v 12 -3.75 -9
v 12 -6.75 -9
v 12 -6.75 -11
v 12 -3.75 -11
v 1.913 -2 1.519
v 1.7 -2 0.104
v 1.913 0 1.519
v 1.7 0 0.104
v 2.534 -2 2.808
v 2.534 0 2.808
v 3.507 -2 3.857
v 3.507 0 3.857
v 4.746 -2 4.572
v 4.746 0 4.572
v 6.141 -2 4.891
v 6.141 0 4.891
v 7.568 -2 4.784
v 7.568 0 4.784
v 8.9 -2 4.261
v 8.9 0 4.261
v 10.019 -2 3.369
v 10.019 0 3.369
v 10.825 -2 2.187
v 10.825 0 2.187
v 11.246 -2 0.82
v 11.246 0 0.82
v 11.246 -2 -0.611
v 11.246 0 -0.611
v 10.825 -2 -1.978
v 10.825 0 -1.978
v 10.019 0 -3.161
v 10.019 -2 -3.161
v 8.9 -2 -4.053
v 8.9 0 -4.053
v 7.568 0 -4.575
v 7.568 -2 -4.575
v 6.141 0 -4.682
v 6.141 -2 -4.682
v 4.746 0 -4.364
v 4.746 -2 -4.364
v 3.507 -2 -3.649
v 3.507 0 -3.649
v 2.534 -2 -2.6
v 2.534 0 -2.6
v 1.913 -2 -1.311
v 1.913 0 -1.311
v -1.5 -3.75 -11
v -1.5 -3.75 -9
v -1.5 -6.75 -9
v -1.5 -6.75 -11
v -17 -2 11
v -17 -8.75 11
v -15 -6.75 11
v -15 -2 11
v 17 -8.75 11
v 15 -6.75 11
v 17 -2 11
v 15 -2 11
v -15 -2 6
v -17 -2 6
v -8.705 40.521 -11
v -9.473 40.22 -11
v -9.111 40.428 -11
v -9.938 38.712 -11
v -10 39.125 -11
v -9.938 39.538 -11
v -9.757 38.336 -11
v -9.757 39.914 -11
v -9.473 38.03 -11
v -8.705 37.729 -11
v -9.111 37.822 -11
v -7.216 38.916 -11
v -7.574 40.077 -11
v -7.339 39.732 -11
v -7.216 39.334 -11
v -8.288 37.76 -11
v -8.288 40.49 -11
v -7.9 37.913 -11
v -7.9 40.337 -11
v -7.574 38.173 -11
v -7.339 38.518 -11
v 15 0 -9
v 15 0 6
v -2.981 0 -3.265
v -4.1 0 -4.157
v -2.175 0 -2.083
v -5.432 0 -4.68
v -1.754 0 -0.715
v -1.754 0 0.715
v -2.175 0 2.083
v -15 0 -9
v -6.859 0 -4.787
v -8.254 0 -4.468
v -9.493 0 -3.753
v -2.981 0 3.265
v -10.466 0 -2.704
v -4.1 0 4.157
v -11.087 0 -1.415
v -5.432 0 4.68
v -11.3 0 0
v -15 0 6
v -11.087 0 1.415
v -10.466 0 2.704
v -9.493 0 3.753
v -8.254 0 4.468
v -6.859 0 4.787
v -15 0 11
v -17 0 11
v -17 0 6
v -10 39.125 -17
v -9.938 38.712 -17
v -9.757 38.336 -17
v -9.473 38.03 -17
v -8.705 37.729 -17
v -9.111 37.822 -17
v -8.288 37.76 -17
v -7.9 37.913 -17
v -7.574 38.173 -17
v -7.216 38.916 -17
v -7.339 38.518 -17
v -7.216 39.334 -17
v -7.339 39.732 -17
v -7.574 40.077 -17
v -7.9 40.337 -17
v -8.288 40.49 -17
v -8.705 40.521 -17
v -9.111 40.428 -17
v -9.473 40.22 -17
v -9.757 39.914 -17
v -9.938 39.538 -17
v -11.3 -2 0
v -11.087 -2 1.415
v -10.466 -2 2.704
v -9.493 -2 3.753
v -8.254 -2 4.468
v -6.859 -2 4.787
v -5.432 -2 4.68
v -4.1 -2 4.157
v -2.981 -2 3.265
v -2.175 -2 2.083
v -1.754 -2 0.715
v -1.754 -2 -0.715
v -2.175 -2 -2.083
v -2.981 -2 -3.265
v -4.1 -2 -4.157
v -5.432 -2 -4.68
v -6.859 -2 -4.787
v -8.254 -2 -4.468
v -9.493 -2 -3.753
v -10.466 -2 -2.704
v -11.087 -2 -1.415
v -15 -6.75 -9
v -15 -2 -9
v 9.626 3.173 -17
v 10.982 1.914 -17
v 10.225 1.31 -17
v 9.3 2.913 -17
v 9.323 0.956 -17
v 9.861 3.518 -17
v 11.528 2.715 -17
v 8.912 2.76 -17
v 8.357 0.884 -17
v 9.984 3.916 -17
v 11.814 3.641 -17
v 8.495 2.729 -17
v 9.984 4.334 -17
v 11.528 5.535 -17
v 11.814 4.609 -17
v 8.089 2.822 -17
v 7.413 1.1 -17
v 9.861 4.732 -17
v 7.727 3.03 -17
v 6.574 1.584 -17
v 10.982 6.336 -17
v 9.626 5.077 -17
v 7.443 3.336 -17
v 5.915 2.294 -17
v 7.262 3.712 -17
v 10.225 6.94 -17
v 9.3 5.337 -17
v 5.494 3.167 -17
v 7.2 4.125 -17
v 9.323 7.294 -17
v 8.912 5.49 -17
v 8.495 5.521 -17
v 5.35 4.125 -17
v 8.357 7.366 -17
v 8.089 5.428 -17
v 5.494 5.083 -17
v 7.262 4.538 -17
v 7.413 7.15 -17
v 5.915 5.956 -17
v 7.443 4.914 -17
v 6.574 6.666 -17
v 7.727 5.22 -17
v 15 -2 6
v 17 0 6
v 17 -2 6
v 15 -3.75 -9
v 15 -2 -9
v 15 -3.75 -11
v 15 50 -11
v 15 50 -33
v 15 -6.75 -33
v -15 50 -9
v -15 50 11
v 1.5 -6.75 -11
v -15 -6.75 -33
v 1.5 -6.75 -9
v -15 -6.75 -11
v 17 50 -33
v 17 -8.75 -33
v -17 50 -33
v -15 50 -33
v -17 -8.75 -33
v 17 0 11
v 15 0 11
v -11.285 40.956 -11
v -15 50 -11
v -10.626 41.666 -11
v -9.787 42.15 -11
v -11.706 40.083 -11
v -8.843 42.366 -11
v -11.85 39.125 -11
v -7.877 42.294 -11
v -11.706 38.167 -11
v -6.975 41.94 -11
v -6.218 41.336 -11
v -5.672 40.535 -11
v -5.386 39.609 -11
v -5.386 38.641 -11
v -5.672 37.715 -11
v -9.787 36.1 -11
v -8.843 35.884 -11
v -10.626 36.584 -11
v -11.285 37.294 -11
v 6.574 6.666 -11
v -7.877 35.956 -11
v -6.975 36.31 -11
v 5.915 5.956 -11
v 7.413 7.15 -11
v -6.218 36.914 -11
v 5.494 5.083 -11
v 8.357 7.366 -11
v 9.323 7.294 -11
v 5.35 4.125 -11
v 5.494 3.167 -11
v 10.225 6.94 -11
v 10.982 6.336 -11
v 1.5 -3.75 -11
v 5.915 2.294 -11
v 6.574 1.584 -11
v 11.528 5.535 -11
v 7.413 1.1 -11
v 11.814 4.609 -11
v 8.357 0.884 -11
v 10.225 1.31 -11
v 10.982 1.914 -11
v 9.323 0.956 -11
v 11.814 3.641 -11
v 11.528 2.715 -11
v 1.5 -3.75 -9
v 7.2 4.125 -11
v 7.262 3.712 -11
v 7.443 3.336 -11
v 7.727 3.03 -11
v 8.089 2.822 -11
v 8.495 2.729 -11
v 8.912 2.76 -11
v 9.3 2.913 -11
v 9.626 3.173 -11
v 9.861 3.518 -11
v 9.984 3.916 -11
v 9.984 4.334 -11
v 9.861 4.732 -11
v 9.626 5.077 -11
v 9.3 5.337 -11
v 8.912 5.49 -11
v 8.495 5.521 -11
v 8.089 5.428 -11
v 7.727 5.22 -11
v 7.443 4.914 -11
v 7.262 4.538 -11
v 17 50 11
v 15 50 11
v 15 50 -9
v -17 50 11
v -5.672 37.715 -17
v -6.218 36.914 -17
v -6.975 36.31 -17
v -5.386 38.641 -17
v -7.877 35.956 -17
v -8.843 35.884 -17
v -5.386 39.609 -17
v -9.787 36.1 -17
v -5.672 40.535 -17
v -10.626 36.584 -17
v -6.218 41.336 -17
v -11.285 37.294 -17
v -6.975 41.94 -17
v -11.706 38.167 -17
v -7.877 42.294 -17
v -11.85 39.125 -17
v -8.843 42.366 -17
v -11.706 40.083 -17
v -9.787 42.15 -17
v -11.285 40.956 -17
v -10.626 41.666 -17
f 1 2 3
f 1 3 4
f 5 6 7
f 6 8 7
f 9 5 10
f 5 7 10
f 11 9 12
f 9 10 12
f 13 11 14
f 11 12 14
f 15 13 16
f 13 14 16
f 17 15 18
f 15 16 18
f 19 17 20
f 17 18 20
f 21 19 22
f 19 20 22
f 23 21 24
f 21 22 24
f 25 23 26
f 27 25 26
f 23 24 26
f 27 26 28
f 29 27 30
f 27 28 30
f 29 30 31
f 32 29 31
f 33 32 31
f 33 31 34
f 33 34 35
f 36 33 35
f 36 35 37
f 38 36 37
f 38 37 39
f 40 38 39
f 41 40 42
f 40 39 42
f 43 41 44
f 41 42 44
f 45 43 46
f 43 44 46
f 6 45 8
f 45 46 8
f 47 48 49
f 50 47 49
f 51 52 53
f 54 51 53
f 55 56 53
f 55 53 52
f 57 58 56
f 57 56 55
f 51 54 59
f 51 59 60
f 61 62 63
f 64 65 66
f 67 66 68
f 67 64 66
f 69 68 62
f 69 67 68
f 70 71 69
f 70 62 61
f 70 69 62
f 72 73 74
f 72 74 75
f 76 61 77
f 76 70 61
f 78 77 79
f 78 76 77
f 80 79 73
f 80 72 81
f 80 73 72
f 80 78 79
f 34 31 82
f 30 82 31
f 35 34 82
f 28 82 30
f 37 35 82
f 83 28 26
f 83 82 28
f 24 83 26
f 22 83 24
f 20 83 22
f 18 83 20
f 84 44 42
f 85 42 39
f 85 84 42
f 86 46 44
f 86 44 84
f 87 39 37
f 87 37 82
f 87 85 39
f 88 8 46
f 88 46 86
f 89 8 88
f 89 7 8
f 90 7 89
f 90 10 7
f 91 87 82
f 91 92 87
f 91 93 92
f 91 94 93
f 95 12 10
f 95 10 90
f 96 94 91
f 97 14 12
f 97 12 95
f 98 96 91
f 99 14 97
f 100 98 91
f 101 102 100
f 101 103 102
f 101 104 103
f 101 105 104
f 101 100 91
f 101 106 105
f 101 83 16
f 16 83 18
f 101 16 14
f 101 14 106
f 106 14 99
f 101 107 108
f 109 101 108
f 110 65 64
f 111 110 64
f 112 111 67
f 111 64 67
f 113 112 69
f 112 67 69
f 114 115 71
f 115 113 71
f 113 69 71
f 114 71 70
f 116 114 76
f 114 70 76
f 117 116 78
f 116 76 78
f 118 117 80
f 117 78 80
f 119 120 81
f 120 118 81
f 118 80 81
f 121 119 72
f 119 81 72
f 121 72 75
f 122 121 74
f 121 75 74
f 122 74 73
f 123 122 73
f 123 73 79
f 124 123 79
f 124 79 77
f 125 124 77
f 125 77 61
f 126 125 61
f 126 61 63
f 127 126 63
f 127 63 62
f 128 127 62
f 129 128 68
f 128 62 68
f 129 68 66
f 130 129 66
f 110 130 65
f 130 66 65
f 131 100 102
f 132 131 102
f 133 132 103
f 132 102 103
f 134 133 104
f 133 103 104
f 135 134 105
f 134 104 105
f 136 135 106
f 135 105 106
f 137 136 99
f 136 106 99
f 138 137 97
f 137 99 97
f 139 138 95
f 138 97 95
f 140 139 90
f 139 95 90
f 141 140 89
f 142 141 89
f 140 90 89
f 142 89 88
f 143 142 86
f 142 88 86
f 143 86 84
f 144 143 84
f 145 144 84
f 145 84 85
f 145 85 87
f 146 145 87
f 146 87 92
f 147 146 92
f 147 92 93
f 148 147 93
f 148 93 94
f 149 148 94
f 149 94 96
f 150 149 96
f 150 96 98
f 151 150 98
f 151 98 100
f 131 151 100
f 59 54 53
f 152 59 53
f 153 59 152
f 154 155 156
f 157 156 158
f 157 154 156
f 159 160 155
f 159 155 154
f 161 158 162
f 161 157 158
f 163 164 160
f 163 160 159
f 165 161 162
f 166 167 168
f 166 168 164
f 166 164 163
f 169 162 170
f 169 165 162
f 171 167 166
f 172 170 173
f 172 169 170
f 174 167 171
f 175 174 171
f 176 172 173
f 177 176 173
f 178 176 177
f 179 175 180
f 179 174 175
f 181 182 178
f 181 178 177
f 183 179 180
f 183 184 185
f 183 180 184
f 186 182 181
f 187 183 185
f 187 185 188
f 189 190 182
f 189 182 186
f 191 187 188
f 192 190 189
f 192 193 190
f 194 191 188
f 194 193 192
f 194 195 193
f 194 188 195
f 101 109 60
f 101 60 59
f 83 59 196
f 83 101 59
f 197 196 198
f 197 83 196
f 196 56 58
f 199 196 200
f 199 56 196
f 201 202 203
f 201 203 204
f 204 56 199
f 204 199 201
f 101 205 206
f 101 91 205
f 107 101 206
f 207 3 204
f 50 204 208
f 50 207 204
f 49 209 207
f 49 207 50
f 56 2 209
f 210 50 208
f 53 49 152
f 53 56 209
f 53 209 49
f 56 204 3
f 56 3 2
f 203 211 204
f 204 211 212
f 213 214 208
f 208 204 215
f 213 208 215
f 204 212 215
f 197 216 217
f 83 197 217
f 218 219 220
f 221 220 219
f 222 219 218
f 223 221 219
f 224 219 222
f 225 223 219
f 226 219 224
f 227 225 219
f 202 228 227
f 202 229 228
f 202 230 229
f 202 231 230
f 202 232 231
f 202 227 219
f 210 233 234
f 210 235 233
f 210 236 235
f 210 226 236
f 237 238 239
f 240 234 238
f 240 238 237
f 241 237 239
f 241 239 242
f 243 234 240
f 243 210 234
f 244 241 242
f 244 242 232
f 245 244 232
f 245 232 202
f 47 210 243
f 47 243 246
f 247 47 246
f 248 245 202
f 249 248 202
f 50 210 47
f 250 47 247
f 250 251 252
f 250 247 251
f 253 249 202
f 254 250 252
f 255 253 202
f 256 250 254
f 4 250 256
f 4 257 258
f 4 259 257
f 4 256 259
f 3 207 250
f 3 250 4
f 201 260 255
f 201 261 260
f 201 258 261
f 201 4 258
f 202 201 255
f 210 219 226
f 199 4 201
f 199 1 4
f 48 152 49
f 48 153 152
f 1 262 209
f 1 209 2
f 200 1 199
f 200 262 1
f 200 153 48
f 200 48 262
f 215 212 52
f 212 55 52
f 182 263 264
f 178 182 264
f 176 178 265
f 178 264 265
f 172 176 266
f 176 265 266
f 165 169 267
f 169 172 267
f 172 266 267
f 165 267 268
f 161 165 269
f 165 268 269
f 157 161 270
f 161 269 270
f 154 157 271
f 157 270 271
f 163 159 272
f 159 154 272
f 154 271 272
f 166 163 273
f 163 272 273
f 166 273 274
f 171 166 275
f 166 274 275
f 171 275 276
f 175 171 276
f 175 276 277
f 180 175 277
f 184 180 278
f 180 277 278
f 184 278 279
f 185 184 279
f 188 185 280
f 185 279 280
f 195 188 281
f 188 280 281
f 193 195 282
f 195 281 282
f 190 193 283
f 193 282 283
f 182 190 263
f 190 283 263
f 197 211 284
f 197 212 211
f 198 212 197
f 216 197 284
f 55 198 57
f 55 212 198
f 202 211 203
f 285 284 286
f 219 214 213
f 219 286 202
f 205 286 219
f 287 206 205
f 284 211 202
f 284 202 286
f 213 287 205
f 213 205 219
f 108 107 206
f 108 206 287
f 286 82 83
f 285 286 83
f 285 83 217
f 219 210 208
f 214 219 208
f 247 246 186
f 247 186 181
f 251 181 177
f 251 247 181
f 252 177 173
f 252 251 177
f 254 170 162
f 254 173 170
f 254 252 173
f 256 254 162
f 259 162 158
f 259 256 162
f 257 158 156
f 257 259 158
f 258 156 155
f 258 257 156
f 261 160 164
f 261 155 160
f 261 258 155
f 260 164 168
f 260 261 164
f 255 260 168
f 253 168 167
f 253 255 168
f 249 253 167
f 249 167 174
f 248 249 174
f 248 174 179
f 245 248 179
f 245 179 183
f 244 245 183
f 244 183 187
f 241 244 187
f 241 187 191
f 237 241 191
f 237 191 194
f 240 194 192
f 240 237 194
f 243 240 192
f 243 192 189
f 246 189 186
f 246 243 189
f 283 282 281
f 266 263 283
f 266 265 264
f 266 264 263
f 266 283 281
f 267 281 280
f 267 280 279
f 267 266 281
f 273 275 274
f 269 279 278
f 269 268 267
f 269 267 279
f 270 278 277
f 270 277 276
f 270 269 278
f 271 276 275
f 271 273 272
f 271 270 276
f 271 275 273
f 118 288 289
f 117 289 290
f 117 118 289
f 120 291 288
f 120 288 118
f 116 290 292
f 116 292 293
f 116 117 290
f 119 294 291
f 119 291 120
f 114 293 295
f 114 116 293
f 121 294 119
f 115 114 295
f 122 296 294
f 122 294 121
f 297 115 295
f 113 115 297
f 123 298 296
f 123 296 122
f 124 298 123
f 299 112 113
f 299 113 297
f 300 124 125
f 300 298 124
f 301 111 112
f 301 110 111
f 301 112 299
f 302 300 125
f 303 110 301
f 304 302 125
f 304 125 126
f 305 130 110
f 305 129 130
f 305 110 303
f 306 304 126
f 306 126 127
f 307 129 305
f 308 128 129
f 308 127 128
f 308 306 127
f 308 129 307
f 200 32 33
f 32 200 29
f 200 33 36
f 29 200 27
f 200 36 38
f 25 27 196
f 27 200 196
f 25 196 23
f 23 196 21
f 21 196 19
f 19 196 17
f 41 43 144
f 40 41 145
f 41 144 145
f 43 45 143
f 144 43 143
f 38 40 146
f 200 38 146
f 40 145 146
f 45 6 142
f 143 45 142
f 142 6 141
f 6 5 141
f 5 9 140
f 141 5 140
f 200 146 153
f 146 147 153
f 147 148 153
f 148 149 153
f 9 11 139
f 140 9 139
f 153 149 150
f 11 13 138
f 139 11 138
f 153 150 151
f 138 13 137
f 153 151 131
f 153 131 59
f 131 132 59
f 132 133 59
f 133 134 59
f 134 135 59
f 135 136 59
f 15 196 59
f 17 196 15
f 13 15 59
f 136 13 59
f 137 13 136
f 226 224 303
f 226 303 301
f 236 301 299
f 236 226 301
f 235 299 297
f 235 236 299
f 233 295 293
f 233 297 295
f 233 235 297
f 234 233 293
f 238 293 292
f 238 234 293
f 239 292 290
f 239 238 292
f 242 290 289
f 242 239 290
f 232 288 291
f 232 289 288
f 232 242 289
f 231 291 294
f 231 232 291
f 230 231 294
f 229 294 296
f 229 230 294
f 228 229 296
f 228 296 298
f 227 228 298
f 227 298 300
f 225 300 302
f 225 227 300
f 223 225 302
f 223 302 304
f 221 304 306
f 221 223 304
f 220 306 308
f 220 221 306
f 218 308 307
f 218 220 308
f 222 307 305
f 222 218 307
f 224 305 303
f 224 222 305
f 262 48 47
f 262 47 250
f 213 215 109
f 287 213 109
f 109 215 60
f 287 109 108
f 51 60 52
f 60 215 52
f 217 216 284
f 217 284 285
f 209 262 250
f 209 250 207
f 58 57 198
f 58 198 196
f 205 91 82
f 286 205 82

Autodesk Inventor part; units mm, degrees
ref_plane "YZ Plane" through (0, 0, 0) normal (1, 0, 0) x (0, 1, 0)
ref_plane "XY Plane" through (0, 0, 0) normal (0, 0, 1) x (1, 0, 0)
ref_plane "bottom of connector plate" through (0, -2, 0) normal (0, 1, 0) x (-1, 0, 0)
sketch "Sketch1" plane through (0, 0, 0) normal (0, 1, 0) x (-1, 0, 0)
  line L0 (17, -11) -> (-17, -11)
  line L1 (-17, -11) -> (-17, 11)
  line L2 (-17, 11) -> (17, 11)
  line L3 (17, 11) -> (17, -11)
  line L4 (17, -11) -> (-17, 11) construction
  line L5 (-17, -11) -> (17, 11) construction
  line L6 (15, -9) -> (-15, -9)
  line L7 (-15, -9) -> (-15, 9)
  line L8 (-15, 9) -> (15, 9)
  line L9 (15, 9) -> (15, -9)
  line L10 (15, -9) -> (-15, 9) construction
  line L11 (-15, -9) -> (15, 9) construction
  line L12 (17, -11) -> (-17, -11)
  line L13 (-17, -11) -> (-17, -33)
  line L14 (-17, -33) -> (17, -33)
  line L15 (17, -33) -> (17, -11)
  line L16 (15, -11) -> (-15, -11)
  line L17 (-15, -11) -> (-15, -26)
  line L18 (-15, -26) -> (15, -26)
  line L19 (15, -26) -> (15, -11)
  line L20 (15, 9) -> (15, 11)
  line L21 (-15, 9) -> (-15, 11)
  line L22 (-15, -26) -> (-15, -33)
  line L23 (15, -26) -> (15, -33)
  line L24 (15, -9) -> (17, -9)
  line L25 (-15, -9) -> (-17, -9)
  point P0 (0, 0)
  dimension "d0" = 34
  dimension "d1" = 22
  dimension "d2" = 30
  dimension "d3" = 18
  dimension "d5" = 22
  dimension "d6" = 15
extrude "top" add sketch "Sketch1" along normal blind 50 contours L15 L14 L23 L19 L0 | L0 L1 L25 L6 L24 L3 | L24 L9 L20 L2 L3 | L17 L22 L14 L13 L0 | L25 L1 L2 L21 L7
sketch "Sketch2" plane through (0, 0, 0) normal (0, 1, 0) x (-1, 0, 0)
  line L0 (17, -33) -> (17, 6)
  line L1 (-17, 11) -> (-17, -33) projected
  line L2 (17, 6) -> (-17, 6)
  line L3 (-17, 6) -> (-17, -33)
  line L4 (-17, -28) -> (17, -28)
  line L5 (17, -28) -> (17, 11)
  line L6 (-15, -11) -> (15, -11)
  line L7 (15, -26) -> (-15, -26)
  line L8 (15, -11) -> (-15, -11)
  line L9 (-15, -11) -> (-15, -26)
  line L10 (-15, -26) -> (15, -26)
  line L11 (15, -26) -> (15, -11)
  line L12 (15, 11) -> (15, -9)
  line L13 (-15, -9) -> (-15, 11)
  line L14 (15, -9) -> (-15, -9)
  line L15 (-15, -9) -> (-15, 11)
  line L16 (-15, 11) -> (15, 11)
  line L17 (15, 11) -> (15, -9)
  circle A0 centre (6.5, 0) radius 4.8
  circle A1 centre (-6.5, 0.1042) radius 4.8
  line L18 (6.5, 0) -> (0, 0) construction
  line L19 (-15, -26) -> (-15, -28)
  line L20 (15, -26) -> (15, -28)
  line L21 (-17, -33) -> (17, -33)
  line L22 (-15, -28) -> (-15, -33)
  line L23 (15, -28) -> (15, -33)
  point P0 (17, -9)
  point P1 (-17, -9)
  point P2 (17, 6)
  dimension "d10" = 9.6
  dimension "d11" = 9.6
  dimension "d12" = 13
  dimension "d13" = 6.5
extrude "plate" add sketch "Sketch2" against normal blind 2 contours L21 L23 L4 L0 | L4 L20 L11 L6 L9 L19 L1 L2 L13 L14 L12 L0 | L21 L1 L4 L22 | L12 L14 L13 L2
sketch "Sketch3" plane through (0, -2, 0) normal (0, 1, 0) x (-1, 0, 0)
  line L0 (17, 11) -> (17, -28)
  line L1 (17, -28) -> (-17, -28)
  line L2 (17, 11) -> (-17, 11)
  line L3 (-17, 11) -> (-17, -28)
  line L4 (-17, -28) -> (17, -28)
  line L5 (17, -28) -> (17, 11)
  line L6 (-15, -26) -> (15, -26)
  line L7 (15, 11) -> (15, -9)
  line L8 (-15, -26) -> (15, -26)
  line L9 (15, -26) -> (15, 9)
  line L10 (15, 9) -> (-15, 9)
  line L11 (-15, 9) -> (-15, -26)
  line L12 (15, 11) -> (15, -9)
  line L13 (15, 9) -> (15, 11)
  line L14 (-15, -9) -> (-15, 11)
  line L15 (-15, 9) -> (-15, 11)
  line L16 (-15, -11) -> (15, -11) projected
  line L17 (17, -9) -> (-17, -9)
  line L18 (15, -11) -> (-15, -11)
  line L19 (-15, -11) -> (-15, -9)
  line L20 (-15, -9) -> (15, -9)
  line L21 (15, -9) -> (15, -11)
  line L22 (-15, -26) -> (-15, -28)
  line L23 (15, -26) -> (15, -28)
  line L24 (-17, -28) -> (-17, -33)
  line L25 (-17, -33) -> (-15, -33)
  line L26 (-15, -33) -> (-15, -28)
  line L27 (17, -28) -> (17, -33)
  line L28 (17, -33) -> (15, -33)
  line L29 (15, -33) -> (15, -28)
  line L30 (-15, -33) -> (15, -33)
  point P0 (0, 0)
  point P1 (15, -26)
  dimension "d17" = 35
  dimension "d45" = 5
  dimension "d46" = 2
  dimension "d47" = 5
  dimension "d48" = 2
extrude "base" add sketch "Sketch3" against normal blind 4.75 contours L0 L17 L7 L2 | L0 L1 L23 L9 L17 | L27 L28 L29 L1 | L9 L16 L11 L17 | L14 L11 L17 L3 L2 | L11 L22 L1 L3 L17 | L26 L25 L24 L1
sketch "Sketch6" plane through (-15, -8.75, -9) normal (0, 0, 1) x (1, 0, 0)
  line L0 (30, 2) -> (30, 58.75) projected
  line L1 (30, 2) -> (27, 2)
  line L2 (27, 2) -> (27, 5)
  line L3 (27, 5) -> (30, 5)
  line L4 (30, 5) -> (30, 2)
  line L5 (16.5, 5) -> (16.5, 2)
  line L6 (13.5, 5) -> (13.5, 2)
  line L7 (13.5, 5) -> (16.5, 5)
  line L8 (16.5, 2) -> (13.5, 2)
  point P0 (15, 8.75)
  dimension "d23" = 3
  dimension "d24" = 3
extrude "Extrusion4" cut sketch "Sketch6" against normal blind 2
sketch "Sketch5" plane through (0, -6.75, 0) normal (0, 1, 0) x (-1, 0, 0)
  line L0 (17, 11) -> (-17, 11)
  line L1 (-17, 11) -> (-17, -28)
  line L2 (-17, -28) -> (17, -28)
  line L3 (17, -28) -> (17, 11)
  line L4 (-17, -28) -> (-17, -33)
  line L5 (-17, -33) -> (17, -33)
  line L6 (17, -33) -> (17, -28)
  dimension "d49" = 39
  dimension "d50" = 5
extrude "Extrusion5" add sketch "Sketch5" against normal blind 2
ref_plane "Work Plane4" through (0, -32.5, 0) normal (0, 1, 0) x (-1, 0, 0)
sketch "Sketch4" plane through (0, -32.5, 0) normal (0, 1, 0) x (-1, 0, 0)
  line L0 (-15, 11) -> (15, 11) projected
  line L1 (-17, -33) -> (17, -33) projected
  line L2 (17, 11) -> (-17, -33) construction
  circle A0 centre (0, -8.5) radius 12
  point P0 (0, 0)
  dimension "d22" = 24
sketch "Sketch7" plane through (15, 50, -11) normal (0, 0, -1) x (-1, 0, 0)
  line L0 (30, -56.75) -> (0, -56.75) projected
  line L1 (3, -3.375) -> (27, -3.375) construction
  line L2 (27, -3.375) -> (27, -53.375) construction
  line L3 (27, -53.375) -> (3, -53.375) construction
  line L4 (3, -53.375) -> (3, -3.375) construction
  line L5 (3, -3.375) -> (27, -53.375) construction
  line L6 (27, -3.375) -> (3, -53.375) construction
  circle A0 centre (-12.1992, -48.387) radius 1.4
  circle A1 centre (-12.1992, -48.387) radius 3.25
  circle A2 centre (6.4, -45.875) radius 1.4
  circle A3 centre (6.4, -45.875) radius 3.25
  circle A4 centre (23.6, -10.875) radius 1.4
  circle A5 centre (23.6, -10.875) radius 3.25
  point P0 (15, -50)
  point P1 (15, -28.375)
  dimension "d31" = 24
  dimension "d32" = 50
  dimension "d33" = 2.8
  dimension "d34" = 6.5
  dimension "d35" = 2.8
  dimension "d36" = 6.5
  dimension "d37" = 2.8
  dimension "d38" = 6.5
  dimension "d39" = 7.5
  dimension "d40" = 3.4
  dimension "d41" = 7.5
  dimension "d42" = 3.4
extrude "Extrusion6" add sketch "Sketch7" along normal blind 6 contours A3 | A5
properties part number "Tclamp_enclosure_3DPrint"
